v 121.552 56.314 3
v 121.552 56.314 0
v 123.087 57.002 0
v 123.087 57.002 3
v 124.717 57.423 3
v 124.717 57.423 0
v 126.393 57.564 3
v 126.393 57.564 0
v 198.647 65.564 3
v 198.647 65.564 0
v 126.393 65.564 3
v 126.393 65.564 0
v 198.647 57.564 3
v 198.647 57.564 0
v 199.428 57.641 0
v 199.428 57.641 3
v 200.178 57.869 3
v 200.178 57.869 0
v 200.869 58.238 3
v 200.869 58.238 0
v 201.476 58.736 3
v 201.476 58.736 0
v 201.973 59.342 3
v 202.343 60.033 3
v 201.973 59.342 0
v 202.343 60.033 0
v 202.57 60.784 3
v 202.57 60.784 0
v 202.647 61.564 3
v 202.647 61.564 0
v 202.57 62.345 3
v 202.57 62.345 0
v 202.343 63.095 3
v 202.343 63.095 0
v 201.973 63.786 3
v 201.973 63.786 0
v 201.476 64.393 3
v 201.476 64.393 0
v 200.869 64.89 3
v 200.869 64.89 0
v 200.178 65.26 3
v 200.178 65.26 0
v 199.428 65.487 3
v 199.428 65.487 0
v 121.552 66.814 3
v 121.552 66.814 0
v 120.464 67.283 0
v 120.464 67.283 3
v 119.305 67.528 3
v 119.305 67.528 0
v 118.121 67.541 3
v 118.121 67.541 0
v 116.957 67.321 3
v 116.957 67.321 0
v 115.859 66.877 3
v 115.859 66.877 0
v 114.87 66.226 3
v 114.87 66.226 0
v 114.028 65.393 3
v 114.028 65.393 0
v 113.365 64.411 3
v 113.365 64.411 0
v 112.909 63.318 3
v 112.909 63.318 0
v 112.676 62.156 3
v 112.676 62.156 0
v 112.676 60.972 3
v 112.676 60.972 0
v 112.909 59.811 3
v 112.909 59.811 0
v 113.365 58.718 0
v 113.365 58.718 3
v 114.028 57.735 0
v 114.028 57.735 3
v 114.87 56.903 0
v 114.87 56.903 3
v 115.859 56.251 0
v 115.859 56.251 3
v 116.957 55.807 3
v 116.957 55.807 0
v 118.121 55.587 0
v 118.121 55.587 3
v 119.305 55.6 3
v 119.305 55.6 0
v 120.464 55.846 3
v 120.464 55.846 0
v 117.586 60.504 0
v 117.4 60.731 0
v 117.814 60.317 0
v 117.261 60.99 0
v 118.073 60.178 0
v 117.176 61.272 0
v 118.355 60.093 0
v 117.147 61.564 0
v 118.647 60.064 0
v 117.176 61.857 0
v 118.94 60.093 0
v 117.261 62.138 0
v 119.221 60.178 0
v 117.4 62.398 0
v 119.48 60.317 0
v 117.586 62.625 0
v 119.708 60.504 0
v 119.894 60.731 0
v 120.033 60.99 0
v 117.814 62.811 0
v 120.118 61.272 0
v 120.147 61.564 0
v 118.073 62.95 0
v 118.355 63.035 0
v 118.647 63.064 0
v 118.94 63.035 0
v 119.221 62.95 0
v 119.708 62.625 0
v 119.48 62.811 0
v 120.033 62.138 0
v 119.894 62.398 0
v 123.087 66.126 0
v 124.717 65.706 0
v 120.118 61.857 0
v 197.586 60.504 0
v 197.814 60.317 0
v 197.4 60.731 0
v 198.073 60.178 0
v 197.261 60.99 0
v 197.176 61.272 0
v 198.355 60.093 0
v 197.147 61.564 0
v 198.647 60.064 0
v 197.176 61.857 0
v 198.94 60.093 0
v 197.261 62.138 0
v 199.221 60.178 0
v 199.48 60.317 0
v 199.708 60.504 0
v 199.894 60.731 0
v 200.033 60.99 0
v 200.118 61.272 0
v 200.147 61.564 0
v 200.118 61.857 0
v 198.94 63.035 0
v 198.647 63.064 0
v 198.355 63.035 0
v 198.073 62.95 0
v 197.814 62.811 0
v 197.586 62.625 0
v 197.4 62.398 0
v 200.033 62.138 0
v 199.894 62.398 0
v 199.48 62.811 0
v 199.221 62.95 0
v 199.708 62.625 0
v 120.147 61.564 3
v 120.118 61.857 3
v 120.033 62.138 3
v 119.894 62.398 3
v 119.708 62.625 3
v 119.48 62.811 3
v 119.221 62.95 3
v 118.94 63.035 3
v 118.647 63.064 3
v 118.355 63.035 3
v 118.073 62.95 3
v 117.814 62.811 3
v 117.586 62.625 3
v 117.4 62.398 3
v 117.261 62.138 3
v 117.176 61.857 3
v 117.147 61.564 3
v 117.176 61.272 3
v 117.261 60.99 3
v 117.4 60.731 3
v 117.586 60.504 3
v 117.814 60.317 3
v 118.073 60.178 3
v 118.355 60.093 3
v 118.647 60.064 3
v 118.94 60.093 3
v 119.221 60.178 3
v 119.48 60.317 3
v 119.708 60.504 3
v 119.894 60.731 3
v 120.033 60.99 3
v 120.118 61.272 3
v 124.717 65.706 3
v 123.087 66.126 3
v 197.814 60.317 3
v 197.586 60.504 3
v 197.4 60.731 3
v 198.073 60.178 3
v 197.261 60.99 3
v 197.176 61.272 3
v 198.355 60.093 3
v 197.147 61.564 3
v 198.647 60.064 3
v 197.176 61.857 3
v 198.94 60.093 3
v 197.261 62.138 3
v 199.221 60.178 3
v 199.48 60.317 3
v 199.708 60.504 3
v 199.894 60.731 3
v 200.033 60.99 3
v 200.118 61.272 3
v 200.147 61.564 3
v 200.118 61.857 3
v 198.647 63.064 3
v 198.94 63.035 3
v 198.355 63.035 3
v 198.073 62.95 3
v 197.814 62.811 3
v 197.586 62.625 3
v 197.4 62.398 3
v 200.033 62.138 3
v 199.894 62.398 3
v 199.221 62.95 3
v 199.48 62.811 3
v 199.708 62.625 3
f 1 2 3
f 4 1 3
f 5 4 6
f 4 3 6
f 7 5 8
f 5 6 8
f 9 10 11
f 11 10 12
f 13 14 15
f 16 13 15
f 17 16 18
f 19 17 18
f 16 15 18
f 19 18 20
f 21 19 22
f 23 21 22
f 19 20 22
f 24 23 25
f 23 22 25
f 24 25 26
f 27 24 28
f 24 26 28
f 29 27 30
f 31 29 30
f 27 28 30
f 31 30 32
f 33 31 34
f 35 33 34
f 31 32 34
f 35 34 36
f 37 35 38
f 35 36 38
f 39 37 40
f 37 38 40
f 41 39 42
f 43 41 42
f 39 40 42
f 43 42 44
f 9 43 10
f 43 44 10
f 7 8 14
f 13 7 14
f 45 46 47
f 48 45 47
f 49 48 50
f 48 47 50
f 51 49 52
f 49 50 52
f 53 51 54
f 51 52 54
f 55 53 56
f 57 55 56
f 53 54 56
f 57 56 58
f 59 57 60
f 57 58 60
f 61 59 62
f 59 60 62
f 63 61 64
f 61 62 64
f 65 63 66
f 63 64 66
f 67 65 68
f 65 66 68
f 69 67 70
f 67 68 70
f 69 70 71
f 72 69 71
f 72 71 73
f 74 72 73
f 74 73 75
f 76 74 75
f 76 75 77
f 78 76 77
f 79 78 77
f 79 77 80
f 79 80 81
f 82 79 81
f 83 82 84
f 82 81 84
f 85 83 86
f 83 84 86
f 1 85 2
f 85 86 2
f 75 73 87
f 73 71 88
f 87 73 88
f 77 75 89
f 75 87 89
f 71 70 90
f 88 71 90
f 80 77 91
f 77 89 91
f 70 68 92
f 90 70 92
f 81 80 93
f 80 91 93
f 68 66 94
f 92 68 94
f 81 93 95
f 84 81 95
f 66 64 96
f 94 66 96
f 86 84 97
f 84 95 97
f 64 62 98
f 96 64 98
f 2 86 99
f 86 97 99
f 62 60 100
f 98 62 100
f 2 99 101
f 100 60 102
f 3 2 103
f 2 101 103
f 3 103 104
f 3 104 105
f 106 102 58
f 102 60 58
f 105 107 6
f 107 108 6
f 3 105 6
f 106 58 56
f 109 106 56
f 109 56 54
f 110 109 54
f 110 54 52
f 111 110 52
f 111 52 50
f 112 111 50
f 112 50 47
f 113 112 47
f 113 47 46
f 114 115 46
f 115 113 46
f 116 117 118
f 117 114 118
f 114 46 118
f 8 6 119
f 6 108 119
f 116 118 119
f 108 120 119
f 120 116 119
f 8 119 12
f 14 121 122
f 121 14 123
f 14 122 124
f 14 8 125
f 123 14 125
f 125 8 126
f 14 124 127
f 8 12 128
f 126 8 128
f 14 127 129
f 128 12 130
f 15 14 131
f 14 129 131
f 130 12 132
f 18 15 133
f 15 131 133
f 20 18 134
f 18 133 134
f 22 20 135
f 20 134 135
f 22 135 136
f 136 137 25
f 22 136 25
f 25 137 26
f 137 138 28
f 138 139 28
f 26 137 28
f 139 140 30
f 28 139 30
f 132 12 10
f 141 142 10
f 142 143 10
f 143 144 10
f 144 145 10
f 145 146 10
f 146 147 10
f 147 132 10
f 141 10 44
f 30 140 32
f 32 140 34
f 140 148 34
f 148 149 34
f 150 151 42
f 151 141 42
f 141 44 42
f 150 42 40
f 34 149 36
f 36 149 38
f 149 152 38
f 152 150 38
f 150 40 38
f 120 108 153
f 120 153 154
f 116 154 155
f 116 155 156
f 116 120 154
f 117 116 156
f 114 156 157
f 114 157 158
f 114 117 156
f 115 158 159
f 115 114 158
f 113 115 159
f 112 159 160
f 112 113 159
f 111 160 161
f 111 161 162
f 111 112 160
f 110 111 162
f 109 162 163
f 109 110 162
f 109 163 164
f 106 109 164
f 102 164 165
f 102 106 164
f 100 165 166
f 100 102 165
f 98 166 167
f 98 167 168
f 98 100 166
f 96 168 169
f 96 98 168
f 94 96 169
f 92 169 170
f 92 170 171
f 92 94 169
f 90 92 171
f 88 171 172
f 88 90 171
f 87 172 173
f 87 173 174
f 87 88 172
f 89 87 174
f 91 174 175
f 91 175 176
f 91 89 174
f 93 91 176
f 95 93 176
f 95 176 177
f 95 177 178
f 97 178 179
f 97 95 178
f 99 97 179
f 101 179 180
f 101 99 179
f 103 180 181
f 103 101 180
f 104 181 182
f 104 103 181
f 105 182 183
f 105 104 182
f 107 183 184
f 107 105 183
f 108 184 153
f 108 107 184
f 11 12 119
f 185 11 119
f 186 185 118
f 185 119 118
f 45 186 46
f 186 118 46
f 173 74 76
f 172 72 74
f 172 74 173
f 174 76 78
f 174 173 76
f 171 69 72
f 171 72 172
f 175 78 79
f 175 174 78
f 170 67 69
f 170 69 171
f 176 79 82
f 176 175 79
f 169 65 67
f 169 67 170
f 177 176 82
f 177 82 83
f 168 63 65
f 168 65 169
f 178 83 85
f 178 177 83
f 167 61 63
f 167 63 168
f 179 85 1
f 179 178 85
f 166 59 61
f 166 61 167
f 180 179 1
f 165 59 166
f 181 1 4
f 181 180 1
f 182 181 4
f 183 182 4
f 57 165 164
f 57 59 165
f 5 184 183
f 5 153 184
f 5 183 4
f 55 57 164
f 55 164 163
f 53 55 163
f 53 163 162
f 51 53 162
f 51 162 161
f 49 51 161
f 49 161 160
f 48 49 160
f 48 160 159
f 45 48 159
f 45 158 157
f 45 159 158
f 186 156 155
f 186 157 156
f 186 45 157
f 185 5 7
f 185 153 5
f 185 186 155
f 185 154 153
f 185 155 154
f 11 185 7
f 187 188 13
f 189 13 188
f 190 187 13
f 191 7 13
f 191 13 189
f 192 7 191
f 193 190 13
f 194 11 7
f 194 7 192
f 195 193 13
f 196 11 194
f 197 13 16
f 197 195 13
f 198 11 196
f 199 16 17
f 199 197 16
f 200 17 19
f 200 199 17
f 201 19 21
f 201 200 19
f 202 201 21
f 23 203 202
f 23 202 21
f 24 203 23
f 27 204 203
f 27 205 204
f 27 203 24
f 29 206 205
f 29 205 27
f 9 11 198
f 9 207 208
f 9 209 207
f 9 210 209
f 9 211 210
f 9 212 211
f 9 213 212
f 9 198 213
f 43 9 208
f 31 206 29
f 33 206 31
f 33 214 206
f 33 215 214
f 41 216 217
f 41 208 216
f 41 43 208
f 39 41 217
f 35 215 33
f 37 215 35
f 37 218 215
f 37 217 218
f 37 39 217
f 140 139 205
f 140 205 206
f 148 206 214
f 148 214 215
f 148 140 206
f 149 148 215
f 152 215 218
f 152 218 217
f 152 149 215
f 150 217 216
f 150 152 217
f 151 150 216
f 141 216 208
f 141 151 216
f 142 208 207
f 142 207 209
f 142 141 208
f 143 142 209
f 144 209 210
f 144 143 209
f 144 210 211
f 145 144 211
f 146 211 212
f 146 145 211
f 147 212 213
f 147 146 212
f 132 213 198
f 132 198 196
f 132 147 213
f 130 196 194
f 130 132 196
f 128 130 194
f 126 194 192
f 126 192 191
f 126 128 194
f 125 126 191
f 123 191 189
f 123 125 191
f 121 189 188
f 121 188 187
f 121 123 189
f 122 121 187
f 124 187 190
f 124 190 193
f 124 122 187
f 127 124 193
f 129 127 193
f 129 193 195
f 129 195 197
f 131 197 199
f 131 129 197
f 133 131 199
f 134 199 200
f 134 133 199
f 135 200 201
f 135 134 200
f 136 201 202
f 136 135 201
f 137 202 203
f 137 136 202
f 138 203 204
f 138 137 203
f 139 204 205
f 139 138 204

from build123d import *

# Parameters (mm, degrees)
ESQUISSE15_R        = 1.5
BOSS_EXTRU_15_DEPTH = 3


with BuildPart() as part:
    # Esquisse15 → Boss.-Extru.15 (new body)
    with BuildSketch(Plane.XY):
        with BuildLine():
            Line((198.647142503, 65.56420703), (126.393109195, 65.56420703))
            ThreePointArc((126.393109195, 65.56420703), (123.893109195, 65.881748664), (121.551880013, 66.81420703))
            ThreePointArc((121.551880013, 66.81420703), (112.647142503, 61.56420703), (121.551880013, 56.31420703))
            ThreePointArc((121.551880013, 56.31420703), (123.893109195, 57.246665395), (126.393109195, 57.56420703))
            Line((126.393109195, 57.56420703), (198.647142503, 57.56420703))
            ThreePointArc((198.647142503, 57.56420703), (202.647142503, 61.56420703), (198.647142503, 65.56420703))
        make_face()
        with Locations((118.647142503, 61.56420703)):
            Circle(ESQUISSE15_R, mode=Mode.SUBTRACT)
        with Locations((198.647142503, 61.56420703)):
            Circle(ESQUISSE15_R, mode=Mode.SUBTRACT)
    extrude(amount=BOSS_EXTRU_15_DEPTH)


solid = part.part
